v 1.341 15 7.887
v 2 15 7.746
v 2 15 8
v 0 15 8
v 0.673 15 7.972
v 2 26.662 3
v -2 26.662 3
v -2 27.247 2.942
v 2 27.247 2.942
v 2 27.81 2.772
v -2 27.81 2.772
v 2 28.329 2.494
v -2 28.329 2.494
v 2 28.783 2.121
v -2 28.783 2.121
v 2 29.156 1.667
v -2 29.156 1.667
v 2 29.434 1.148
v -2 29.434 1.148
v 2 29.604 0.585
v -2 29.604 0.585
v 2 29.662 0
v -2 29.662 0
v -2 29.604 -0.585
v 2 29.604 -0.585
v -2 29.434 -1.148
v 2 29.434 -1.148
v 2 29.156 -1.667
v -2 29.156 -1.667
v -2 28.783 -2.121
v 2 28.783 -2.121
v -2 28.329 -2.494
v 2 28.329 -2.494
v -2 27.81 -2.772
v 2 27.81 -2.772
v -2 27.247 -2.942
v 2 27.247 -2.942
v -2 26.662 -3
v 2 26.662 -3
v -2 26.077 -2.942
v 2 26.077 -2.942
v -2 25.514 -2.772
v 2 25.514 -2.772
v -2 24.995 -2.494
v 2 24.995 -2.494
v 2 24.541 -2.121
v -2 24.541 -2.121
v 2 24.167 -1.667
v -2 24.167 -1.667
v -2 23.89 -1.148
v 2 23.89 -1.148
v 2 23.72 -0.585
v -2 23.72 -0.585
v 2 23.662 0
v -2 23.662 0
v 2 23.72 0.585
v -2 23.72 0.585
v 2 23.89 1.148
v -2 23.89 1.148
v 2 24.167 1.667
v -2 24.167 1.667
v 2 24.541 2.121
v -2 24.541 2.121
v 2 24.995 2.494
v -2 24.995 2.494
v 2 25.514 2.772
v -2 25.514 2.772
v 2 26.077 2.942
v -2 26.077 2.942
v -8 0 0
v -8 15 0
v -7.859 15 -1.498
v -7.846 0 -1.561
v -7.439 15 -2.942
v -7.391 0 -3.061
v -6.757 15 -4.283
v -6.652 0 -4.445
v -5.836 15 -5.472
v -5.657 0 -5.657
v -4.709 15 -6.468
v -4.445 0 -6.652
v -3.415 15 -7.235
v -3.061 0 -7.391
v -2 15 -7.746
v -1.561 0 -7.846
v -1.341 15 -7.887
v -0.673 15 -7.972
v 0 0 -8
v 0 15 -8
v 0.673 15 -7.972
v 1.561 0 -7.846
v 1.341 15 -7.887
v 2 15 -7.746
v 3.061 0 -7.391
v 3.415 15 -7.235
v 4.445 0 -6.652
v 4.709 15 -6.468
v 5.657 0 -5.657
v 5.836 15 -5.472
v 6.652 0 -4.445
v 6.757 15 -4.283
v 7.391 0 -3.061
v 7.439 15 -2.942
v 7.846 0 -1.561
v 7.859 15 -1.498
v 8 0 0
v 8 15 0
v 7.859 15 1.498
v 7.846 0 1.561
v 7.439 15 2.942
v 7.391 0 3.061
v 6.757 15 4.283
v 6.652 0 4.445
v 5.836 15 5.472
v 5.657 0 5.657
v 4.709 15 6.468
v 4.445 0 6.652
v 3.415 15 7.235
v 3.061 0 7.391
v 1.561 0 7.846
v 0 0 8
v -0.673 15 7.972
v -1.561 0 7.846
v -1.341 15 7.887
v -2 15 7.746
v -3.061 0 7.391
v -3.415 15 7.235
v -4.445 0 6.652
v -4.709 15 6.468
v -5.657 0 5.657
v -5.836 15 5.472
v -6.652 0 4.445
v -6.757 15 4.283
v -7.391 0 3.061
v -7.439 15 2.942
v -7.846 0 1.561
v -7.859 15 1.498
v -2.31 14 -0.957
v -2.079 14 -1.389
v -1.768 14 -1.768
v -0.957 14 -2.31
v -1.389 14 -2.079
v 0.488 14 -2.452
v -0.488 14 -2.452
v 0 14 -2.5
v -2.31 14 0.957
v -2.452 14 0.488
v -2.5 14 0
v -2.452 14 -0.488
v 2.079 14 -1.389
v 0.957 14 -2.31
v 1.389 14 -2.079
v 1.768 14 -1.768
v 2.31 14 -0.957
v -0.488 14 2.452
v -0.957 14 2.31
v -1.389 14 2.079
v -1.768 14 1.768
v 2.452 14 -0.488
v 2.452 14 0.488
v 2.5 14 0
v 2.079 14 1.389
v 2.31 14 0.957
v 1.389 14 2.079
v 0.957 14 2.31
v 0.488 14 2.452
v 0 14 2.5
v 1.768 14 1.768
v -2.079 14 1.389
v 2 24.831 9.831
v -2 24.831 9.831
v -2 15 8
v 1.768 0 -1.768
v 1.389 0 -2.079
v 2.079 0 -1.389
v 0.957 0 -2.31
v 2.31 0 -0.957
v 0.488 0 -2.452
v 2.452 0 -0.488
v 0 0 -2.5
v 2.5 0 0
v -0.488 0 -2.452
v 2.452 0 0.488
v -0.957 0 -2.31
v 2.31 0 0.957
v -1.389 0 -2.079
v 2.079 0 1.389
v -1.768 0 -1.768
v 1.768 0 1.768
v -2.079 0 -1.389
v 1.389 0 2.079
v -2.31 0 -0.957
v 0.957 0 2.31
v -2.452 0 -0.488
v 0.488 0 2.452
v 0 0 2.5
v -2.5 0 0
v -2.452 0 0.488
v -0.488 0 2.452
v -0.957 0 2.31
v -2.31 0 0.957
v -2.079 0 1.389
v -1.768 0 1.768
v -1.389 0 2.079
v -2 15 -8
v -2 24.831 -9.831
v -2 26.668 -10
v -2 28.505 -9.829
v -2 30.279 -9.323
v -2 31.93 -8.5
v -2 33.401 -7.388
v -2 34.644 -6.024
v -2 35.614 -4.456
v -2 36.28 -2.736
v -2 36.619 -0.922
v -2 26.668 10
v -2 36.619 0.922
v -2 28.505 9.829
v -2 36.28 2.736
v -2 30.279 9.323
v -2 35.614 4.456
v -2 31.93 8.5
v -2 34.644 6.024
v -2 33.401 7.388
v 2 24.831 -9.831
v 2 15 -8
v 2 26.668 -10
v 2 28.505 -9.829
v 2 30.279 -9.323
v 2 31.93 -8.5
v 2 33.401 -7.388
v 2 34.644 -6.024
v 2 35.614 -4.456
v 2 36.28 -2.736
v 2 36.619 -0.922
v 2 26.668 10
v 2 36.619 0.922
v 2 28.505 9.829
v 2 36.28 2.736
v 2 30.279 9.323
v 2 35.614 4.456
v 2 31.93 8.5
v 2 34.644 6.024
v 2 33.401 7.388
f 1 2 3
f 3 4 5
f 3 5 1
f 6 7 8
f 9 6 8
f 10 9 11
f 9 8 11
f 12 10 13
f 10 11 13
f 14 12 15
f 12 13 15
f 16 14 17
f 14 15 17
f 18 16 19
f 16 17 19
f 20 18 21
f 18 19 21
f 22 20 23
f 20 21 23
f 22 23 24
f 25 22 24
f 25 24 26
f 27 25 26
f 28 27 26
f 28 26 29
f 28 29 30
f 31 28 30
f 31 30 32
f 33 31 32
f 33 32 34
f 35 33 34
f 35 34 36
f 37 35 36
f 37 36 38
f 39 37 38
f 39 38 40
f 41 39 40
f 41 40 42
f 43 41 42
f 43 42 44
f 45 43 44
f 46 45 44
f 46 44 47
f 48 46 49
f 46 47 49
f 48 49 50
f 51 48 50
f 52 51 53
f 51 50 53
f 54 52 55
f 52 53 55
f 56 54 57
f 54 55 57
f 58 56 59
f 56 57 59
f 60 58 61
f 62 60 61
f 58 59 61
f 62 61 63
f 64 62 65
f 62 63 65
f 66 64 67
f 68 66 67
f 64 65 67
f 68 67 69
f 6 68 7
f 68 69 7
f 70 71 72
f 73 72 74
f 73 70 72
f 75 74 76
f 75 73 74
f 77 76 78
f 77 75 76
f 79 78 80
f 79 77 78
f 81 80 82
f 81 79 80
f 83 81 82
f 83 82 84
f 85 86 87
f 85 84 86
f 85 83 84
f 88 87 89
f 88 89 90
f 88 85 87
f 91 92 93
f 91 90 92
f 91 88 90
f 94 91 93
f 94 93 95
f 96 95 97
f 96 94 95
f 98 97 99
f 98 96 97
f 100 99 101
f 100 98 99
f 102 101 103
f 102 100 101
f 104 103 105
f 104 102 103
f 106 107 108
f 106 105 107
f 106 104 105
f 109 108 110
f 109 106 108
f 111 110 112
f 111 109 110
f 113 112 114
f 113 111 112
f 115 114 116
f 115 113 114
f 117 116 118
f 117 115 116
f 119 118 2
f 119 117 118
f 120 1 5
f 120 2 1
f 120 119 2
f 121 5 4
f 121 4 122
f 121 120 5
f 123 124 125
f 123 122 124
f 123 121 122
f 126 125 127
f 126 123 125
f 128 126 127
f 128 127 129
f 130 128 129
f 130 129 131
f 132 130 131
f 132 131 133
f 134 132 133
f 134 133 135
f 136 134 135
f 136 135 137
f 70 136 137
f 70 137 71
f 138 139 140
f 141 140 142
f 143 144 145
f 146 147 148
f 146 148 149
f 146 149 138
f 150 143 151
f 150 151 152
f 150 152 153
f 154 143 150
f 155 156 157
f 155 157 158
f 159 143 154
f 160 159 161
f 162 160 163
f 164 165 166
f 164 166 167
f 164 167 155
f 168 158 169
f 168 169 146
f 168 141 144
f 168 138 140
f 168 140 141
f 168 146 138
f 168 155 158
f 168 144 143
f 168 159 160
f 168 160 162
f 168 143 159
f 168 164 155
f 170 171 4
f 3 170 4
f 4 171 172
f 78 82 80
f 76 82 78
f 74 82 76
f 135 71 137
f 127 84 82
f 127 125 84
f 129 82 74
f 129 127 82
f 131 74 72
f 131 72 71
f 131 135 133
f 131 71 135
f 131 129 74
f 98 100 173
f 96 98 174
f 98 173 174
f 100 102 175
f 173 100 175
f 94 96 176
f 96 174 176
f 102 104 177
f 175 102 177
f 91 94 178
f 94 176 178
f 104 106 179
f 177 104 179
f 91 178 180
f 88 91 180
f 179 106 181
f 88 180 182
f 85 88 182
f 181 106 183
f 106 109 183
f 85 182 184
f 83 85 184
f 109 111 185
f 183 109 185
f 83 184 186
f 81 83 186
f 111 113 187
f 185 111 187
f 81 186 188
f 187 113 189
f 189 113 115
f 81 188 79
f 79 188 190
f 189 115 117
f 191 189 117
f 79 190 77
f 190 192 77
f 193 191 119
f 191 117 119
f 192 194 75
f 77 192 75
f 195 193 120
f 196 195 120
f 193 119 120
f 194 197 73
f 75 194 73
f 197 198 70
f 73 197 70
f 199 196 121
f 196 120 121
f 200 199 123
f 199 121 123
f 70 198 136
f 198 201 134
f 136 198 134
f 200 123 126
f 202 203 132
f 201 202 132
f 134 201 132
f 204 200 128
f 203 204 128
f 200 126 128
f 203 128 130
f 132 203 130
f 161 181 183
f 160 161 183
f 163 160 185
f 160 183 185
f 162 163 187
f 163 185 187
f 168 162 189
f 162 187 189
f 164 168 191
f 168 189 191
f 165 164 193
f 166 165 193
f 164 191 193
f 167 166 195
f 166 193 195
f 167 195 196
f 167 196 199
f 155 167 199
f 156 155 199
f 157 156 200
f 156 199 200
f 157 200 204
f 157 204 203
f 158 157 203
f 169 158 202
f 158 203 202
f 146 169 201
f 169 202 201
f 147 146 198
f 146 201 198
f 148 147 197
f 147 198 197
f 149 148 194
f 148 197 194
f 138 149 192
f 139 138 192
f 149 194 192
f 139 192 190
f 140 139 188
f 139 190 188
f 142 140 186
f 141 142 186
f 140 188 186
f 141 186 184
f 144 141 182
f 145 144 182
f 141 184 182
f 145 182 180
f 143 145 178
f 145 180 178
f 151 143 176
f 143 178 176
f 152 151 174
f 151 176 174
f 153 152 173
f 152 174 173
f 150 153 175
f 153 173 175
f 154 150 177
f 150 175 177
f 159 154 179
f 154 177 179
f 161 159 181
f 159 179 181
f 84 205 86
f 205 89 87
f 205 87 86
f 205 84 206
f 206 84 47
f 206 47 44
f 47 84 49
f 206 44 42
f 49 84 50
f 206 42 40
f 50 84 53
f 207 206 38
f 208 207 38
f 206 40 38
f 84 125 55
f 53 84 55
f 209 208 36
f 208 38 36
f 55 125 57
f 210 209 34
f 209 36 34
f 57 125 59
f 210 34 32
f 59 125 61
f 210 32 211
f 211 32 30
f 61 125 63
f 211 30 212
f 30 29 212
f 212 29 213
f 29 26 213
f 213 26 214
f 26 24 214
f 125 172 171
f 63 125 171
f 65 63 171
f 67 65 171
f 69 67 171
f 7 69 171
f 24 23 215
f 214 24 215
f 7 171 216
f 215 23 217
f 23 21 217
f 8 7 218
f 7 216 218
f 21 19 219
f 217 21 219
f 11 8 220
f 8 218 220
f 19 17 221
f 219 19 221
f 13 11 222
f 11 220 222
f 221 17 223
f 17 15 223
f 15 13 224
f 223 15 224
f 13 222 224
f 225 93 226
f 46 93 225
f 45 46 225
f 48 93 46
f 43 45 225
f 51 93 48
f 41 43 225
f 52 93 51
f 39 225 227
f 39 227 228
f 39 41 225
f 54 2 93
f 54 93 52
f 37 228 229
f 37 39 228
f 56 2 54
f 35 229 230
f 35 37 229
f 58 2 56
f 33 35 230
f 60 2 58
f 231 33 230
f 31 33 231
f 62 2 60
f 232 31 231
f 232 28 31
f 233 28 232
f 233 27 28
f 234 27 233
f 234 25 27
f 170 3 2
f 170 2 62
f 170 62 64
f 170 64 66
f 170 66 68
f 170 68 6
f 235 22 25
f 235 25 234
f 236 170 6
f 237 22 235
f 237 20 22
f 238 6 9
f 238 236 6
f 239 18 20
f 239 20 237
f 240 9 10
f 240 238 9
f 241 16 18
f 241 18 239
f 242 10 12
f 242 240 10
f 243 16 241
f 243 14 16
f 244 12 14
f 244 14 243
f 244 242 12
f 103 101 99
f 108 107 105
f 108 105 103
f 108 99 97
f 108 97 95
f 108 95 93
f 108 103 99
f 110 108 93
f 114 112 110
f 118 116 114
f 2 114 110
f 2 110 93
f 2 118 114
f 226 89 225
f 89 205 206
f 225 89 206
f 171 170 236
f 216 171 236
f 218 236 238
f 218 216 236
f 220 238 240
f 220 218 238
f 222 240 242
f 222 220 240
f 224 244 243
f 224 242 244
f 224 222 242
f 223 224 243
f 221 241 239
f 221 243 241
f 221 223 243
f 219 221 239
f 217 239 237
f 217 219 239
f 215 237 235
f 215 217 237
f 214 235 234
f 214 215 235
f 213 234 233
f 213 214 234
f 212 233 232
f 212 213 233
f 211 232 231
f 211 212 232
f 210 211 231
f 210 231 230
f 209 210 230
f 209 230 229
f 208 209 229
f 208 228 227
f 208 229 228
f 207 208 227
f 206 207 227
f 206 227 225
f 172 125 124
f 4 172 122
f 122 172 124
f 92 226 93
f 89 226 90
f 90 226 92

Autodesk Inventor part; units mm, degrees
ref_plane "YZ Plane" through (0, 0, 0) normal (1, 0, 0) x (0, 1, 0)
ref_plane "XZ Plane" through (0, 0, 0) normal (0, 1, 0) x (-1, 0, 0)
ref_plane "XY Plane" through (0, 0, 0) normal (0, 0, 1) x (1, 0, 0)
sketch "Boceto1" plane through (0, 0, 0) normal (0, 1, 0) x (-1, 0, 0)
  circle A0 centre (0, 0) radius 8
  dimension "d0" = 16
extrude "Extrusión1" add sketch "Boceto1" along normal blind 15
sketch "Boceto5" plane through (0, 0, 0) normal (1, 0, 0) x (0, 1, 0)
  line L0 (15, -8) -> (15, 8) projected
  line L1 (15, -8) -> (24.831, -9.831)
  arc A0 (24.831, -9.831) -> (24.831, 9.831) centre (26.6619, 0) ccw
  line L2 (24.831, 9.831) -> (15, 8)
  point P0 (0, 0)
  point P1 (15, 0)
  dimension "d18" = 10
  dimension "d27" = 10
extrude "Extrusión5" add sketch "Boceto5" along normal mid plane 4
sketch "Boceto6" plane through (-2, 0, 0) normal (-1, 0, 0) x (0, 0, 1)
  arc A0 (9.831, 24.831) -> (-9.831, 24.831) centre (0, 26.6619) ccw projected
  circle A1 centre (0, 26.6619) radius 3
  point P0 (0, 0)
  dimension "d28" = 6
extrude "Extrusión6" cut sketch "Boceto6" against normal blind 4
sketch "Boceto7" plane through (0, 0, 0) normal (0, -1, 0) x (1, 0, 0)
  circle A0 centre (0, 0) radius 2.5
  dimension "d24" = 5
extrude "Extrusión7" cut sketch "Boceto7" against normal blind 14
properties part number "shocks_holder" material "Goma"
